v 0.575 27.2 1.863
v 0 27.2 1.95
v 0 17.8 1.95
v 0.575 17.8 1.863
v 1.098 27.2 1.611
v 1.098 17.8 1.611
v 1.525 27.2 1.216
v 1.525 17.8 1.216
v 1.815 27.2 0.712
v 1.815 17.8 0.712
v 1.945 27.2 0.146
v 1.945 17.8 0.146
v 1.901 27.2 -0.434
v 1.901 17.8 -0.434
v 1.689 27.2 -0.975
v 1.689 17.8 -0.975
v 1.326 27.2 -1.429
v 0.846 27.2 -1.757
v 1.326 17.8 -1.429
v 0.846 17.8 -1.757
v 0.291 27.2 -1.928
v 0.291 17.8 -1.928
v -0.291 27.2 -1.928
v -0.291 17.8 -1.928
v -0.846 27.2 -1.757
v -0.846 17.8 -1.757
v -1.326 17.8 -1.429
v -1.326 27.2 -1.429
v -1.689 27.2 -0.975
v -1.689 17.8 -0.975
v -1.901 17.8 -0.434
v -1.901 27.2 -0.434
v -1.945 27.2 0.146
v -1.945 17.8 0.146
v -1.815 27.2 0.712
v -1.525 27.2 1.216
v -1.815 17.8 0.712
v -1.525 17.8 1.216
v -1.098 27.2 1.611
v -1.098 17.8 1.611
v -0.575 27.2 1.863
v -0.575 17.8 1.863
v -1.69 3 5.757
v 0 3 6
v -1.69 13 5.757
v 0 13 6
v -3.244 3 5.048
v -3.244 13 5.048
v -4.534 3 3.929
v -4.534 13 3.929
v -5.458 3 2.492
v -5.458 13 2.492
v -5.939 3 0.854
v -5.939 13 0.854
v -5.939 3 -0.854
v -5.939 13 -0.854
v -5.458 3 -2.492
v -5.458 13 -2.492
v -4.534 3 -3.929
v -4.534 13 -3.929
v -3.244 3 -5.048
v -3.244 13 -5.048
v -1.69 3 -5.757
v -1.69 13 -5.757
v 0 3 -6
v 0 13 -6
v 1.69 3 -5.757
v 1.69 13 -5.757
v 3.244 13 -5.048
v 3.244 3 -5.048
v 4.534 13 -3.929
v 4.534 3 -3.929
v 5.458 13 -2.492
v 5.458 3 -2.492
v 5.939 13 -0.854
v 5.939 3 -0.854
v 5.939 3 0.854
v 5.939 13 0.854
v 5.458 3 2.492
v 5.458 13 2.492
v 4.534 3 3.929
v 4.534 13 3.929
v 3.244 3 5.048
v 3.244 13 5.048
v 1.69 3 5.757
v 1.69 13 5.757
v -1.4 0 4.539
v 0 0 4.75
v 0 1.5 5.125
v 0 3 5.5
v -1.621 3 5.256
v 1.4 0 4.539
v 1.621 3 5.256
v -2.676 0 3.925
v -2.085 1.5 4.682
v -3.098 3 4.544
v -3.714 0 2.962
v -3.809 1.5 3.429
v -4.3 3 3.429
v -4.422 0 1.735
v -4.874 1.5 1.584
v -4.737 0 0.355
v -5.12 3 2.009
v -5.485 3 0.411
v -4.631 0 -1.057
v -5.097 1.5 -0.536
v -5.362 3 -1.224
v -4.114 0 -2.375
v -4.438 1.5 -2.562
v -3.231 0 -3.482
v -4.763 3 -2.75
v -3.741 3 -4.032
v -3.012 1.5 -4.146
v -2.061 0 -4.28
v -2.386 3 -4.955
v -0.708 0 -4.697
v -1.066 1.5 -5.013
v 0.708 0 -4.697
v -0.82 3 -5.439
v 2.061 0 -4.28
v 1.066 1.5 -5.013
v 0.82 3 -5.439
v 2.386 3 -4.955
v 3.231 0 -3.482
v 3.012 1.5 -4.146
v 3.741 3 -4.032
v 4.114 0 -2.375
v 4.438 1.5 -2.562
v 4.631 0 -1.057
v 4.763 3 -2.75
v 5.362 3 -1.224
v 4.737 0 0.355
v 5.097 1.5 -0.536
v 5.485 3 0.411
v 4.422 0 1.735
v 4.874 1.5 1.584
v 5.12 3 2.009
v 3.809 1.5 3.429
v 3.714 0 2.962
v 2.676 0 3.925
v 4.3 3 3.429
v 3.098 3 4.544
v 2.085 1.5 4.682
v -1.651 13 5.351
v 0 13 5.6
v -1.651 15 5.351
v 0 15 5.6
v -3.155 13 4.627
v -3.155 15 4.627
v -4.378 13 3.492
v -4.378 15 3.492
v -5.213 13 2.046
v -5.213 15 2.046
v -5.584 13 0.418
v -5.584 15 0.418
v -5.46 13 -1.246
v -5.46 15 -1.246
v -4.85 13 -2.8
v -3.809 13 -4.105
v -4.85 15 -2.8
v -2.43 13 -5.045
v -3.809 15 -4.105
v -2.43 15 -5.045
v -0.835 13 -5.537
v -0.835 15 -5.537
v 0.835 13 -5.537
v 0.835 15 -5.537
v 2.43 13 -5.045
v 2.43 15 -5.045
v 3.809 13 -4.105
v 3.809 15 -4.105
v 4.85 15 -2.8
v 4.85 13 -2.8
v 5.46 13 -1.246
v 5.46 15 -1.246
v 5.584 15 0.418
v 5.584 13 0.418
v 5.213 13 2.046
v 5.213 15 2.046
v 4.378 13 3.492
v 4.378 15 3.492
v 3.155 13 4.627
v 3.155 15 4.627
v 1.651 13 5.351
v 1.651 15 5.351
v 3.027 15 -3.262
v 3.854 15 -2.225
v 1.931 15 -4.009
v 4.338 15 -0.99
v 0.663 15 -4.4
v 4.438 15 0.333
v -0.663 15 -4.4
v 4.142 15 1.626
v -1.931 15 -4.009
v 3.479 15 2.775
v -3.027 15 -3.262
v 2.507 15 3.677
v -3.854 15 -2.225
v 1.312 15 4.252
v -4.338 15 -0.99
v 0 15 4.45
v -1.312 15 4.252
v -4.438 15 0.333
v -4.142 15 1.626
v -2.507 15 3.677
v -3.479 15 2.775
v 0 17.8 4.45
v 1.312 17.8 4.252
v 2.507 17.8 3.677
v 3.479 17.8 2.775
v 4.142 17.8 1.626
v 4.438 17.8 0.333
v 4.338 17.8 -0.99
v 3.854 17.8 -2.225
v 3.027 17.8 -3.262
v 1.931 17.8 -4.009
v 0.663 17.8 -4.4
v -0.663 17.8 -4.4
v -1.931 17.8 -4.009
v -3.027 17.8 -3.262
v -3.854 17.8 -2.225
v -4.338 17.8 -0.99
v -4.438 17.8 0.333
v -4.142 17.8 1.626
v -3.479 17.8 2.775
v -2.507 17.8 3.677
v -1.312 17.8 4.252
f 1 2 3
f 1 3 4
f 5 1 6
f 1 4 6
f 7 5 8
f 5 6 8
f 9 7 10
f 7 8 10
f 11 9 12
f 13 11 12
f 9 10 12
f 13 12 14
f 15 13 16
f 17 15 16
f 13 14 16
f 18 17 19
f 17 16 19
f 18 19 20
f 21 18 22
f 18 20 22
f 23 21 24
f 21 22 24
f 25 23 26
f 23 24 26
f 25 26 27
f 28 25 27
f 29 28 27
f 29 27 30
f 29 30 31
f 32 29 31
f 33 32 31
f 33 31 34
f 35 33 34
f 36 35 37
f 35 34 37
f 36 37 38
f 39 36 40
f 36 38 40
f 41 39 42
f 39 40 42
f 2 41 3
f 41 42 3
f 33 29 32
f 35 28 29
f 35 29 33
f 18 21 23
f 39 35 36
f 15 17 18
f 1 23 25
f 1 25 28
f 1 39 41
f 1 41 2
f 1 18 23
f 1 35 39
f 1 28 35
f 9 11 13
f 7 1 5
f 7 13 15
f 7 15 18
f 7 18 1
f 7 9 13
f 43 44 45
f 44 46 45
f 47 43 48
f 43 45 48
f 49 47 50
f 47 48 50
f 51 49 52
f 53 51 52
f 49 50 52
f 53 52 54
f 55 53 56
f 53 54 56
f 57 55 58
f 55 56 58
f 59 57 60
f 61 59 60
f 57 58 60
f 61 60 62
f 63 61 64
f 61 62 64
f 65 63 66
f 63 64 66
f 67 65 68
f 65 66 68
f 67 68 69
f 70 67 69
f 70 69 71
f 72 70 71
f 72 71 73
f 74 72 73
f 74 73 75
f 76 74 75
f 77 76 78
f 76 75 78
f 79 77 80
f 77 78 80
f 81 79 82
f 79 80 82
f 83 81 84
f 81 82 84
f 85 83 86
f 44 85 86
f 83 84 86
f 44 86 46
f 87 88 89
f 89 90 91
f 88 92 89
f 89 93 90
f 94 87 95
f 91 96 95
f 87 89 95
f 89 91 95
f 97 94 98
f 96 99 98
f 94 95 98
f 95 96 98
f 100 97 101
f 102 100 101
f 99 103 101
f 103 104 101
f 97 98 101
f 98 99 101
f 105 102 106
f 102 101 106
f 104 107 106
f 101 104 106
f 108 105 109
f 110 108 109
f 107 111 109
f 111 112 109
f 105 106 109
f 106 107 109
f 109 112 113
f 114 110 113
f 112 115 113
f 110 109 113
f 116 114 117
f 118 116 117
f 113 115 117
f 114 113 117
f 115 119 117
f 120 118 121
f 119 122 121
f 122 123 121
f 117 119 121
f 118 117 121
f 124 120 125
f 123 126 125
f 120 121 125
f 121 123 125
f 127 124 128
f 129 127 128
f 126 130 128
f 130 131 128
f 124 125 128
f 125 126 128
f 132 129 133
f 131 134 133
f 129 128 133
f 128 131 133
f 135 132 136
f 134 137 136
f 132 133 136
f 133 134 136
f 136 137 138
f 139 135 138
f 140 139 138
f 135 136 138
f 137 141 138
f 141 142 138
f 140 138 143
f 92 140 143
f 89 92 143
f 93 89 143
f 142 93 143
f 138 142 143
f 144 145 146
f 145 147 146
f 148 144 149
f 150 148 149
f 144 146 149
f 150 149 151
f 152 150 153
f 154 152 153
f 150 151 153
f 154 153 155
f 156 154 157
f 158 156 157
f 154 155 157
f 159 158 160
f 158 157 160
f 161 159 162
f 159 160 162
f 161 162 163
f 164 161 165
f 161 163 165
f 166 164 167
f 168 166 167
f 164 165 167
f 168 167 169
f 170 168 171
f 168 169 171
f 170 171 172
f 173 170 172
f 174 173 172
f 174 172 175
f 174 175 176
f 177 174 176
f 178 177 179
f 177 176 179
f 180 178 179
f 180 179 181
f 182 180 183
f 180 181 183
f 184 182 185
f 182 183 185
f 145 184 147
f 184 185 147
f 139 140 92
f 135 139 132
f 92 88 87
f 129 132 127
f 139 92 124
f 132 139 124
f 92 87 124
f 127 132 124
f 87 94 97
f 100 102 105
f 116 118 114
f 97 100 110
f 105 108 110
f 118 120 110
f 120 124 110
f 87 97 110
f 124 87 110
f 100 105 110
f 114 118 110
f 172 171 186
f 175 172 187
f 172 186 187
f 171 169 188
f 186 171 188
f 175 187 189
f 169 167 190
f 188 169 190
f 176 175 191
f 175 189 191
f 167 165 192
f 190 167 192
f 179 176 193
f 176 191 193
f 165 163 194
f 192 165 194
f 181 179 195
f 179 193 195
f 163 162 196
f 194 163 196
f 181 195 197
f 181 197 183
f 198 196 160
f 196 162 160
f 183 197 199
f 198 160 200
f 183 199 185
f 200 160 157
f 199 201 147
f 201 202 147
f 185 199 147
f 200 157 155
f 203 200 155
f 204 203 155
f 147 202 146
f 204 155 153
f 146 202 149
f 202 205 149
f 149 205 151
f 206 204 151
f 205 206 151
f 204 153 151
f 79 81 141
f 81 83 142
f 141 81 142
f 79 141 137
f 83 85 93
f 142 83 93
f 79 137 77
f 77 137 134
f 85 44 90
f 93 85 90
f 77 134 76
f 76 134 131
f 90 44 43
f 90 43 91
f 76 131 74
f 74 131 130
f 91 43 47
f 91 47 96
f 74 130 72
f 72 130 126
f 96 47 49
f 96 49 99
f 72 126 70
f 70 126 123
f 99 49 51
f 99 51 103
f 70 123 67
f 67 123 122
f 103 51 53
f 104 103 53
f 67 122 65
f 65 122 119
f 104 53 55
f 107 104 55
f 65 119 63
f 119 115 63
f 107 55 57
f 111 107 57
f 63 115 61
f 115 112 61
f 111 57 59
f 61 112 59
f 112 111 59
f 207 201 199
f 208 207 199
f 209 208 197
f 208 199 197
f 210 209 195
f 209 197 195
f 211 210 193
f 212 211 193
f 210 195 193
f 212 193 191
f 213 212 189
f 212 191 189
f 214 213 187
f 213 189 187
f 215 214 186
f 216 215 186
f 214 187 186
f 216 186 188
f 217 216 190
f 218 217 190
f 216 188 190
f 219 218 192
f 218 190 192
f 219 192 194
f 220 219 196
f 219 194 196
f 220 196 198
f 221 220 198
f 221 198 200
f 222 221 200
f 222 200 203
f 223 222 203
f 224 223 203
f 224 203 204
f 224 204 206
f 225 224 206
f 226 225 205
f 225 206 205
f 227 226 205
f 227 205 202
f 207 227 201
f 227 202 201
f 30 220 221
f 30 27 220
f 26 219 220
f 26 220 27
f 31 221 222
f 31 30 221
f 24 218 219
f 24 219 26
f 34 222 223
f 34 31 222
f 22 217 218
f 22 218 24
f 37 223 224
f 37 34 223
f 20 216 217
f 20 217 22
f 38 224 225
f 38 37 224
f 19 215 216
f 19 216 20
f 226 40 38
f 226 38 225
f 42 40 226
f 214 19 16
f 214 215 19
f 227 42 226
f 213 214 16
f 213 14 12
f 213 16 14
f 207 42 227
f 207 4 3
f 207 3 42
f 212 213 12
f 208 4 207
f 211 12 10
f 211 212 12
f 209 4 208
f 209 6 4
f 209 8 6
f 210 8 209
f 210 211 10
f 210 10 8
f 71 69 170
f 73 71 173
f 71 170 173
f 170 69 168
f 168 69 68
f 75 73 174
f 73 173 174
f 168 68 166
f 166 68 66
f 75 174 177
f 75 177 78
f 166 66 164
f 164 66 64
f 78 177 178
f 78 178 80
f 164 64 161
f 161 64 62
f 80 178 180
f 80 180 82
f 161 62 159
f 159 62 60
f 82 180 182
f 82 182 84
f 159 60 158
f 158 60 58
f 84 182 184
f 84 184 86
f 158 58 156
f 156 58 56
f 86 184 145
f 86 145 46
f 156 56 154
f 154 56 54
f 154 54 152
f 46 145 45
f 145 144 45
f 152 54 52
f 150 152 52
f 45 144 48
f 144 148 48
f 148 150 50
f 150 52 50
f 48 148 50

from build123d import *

# Parameters (mm, degrees)
SKETCH_2_R      = 4.45
EXTRUDE_1_DEPTH = 2.8
SKETCH_3_R      = 1.95
EXTRUDE_2_DEPTH = 9.4


with BuildPart() as part:
    # 草图1 → 旋转1 (revolve)
    with BuildSketch(Plane.XY, mode=Mode.PRIVATE) as revolve_1_sk:
        Polygon((0, 0), (4.75, 0), (5.5, 3), (6, 3), (6, 13), (5.6, 13), (5.6, 15), (0, 15), align=None)
    revolve(revolve_1_sk.sketch.rotate(Axis((0, 15.733998589, 0), (0, -1, 0)), 90), axis=Axis((0, 15.733998589, 0), (0, -1, 0)))

    # 草图2 → 凸台-拉伸1 (add)
    with BuildSketch(Plane(origin=(0, 15, 0), x_dir=(1, 0, 0), z_dir=(0, 1, 0))):
        with Locations(Location((0, 0, 0), (0, 0, 270))):
            Circle(SKETCH_2_R)
    extrude(amount=EXTRUDE_1_DEPTH)

    # 草图3 → 凸台-拉伸2 (add)
    with BuildSketch(Plane(origin=(0, 17.8, 0), x_dir=(1, 0, 0), z_dir=(0, 1, 0))):
        with Locations(Location((0, 0, 0), (0, 0, 270))):
            Circle(SKETCH_3_R)
    extrude(amount=EXTRUDE_2_DEPTH)


solid = part.part
